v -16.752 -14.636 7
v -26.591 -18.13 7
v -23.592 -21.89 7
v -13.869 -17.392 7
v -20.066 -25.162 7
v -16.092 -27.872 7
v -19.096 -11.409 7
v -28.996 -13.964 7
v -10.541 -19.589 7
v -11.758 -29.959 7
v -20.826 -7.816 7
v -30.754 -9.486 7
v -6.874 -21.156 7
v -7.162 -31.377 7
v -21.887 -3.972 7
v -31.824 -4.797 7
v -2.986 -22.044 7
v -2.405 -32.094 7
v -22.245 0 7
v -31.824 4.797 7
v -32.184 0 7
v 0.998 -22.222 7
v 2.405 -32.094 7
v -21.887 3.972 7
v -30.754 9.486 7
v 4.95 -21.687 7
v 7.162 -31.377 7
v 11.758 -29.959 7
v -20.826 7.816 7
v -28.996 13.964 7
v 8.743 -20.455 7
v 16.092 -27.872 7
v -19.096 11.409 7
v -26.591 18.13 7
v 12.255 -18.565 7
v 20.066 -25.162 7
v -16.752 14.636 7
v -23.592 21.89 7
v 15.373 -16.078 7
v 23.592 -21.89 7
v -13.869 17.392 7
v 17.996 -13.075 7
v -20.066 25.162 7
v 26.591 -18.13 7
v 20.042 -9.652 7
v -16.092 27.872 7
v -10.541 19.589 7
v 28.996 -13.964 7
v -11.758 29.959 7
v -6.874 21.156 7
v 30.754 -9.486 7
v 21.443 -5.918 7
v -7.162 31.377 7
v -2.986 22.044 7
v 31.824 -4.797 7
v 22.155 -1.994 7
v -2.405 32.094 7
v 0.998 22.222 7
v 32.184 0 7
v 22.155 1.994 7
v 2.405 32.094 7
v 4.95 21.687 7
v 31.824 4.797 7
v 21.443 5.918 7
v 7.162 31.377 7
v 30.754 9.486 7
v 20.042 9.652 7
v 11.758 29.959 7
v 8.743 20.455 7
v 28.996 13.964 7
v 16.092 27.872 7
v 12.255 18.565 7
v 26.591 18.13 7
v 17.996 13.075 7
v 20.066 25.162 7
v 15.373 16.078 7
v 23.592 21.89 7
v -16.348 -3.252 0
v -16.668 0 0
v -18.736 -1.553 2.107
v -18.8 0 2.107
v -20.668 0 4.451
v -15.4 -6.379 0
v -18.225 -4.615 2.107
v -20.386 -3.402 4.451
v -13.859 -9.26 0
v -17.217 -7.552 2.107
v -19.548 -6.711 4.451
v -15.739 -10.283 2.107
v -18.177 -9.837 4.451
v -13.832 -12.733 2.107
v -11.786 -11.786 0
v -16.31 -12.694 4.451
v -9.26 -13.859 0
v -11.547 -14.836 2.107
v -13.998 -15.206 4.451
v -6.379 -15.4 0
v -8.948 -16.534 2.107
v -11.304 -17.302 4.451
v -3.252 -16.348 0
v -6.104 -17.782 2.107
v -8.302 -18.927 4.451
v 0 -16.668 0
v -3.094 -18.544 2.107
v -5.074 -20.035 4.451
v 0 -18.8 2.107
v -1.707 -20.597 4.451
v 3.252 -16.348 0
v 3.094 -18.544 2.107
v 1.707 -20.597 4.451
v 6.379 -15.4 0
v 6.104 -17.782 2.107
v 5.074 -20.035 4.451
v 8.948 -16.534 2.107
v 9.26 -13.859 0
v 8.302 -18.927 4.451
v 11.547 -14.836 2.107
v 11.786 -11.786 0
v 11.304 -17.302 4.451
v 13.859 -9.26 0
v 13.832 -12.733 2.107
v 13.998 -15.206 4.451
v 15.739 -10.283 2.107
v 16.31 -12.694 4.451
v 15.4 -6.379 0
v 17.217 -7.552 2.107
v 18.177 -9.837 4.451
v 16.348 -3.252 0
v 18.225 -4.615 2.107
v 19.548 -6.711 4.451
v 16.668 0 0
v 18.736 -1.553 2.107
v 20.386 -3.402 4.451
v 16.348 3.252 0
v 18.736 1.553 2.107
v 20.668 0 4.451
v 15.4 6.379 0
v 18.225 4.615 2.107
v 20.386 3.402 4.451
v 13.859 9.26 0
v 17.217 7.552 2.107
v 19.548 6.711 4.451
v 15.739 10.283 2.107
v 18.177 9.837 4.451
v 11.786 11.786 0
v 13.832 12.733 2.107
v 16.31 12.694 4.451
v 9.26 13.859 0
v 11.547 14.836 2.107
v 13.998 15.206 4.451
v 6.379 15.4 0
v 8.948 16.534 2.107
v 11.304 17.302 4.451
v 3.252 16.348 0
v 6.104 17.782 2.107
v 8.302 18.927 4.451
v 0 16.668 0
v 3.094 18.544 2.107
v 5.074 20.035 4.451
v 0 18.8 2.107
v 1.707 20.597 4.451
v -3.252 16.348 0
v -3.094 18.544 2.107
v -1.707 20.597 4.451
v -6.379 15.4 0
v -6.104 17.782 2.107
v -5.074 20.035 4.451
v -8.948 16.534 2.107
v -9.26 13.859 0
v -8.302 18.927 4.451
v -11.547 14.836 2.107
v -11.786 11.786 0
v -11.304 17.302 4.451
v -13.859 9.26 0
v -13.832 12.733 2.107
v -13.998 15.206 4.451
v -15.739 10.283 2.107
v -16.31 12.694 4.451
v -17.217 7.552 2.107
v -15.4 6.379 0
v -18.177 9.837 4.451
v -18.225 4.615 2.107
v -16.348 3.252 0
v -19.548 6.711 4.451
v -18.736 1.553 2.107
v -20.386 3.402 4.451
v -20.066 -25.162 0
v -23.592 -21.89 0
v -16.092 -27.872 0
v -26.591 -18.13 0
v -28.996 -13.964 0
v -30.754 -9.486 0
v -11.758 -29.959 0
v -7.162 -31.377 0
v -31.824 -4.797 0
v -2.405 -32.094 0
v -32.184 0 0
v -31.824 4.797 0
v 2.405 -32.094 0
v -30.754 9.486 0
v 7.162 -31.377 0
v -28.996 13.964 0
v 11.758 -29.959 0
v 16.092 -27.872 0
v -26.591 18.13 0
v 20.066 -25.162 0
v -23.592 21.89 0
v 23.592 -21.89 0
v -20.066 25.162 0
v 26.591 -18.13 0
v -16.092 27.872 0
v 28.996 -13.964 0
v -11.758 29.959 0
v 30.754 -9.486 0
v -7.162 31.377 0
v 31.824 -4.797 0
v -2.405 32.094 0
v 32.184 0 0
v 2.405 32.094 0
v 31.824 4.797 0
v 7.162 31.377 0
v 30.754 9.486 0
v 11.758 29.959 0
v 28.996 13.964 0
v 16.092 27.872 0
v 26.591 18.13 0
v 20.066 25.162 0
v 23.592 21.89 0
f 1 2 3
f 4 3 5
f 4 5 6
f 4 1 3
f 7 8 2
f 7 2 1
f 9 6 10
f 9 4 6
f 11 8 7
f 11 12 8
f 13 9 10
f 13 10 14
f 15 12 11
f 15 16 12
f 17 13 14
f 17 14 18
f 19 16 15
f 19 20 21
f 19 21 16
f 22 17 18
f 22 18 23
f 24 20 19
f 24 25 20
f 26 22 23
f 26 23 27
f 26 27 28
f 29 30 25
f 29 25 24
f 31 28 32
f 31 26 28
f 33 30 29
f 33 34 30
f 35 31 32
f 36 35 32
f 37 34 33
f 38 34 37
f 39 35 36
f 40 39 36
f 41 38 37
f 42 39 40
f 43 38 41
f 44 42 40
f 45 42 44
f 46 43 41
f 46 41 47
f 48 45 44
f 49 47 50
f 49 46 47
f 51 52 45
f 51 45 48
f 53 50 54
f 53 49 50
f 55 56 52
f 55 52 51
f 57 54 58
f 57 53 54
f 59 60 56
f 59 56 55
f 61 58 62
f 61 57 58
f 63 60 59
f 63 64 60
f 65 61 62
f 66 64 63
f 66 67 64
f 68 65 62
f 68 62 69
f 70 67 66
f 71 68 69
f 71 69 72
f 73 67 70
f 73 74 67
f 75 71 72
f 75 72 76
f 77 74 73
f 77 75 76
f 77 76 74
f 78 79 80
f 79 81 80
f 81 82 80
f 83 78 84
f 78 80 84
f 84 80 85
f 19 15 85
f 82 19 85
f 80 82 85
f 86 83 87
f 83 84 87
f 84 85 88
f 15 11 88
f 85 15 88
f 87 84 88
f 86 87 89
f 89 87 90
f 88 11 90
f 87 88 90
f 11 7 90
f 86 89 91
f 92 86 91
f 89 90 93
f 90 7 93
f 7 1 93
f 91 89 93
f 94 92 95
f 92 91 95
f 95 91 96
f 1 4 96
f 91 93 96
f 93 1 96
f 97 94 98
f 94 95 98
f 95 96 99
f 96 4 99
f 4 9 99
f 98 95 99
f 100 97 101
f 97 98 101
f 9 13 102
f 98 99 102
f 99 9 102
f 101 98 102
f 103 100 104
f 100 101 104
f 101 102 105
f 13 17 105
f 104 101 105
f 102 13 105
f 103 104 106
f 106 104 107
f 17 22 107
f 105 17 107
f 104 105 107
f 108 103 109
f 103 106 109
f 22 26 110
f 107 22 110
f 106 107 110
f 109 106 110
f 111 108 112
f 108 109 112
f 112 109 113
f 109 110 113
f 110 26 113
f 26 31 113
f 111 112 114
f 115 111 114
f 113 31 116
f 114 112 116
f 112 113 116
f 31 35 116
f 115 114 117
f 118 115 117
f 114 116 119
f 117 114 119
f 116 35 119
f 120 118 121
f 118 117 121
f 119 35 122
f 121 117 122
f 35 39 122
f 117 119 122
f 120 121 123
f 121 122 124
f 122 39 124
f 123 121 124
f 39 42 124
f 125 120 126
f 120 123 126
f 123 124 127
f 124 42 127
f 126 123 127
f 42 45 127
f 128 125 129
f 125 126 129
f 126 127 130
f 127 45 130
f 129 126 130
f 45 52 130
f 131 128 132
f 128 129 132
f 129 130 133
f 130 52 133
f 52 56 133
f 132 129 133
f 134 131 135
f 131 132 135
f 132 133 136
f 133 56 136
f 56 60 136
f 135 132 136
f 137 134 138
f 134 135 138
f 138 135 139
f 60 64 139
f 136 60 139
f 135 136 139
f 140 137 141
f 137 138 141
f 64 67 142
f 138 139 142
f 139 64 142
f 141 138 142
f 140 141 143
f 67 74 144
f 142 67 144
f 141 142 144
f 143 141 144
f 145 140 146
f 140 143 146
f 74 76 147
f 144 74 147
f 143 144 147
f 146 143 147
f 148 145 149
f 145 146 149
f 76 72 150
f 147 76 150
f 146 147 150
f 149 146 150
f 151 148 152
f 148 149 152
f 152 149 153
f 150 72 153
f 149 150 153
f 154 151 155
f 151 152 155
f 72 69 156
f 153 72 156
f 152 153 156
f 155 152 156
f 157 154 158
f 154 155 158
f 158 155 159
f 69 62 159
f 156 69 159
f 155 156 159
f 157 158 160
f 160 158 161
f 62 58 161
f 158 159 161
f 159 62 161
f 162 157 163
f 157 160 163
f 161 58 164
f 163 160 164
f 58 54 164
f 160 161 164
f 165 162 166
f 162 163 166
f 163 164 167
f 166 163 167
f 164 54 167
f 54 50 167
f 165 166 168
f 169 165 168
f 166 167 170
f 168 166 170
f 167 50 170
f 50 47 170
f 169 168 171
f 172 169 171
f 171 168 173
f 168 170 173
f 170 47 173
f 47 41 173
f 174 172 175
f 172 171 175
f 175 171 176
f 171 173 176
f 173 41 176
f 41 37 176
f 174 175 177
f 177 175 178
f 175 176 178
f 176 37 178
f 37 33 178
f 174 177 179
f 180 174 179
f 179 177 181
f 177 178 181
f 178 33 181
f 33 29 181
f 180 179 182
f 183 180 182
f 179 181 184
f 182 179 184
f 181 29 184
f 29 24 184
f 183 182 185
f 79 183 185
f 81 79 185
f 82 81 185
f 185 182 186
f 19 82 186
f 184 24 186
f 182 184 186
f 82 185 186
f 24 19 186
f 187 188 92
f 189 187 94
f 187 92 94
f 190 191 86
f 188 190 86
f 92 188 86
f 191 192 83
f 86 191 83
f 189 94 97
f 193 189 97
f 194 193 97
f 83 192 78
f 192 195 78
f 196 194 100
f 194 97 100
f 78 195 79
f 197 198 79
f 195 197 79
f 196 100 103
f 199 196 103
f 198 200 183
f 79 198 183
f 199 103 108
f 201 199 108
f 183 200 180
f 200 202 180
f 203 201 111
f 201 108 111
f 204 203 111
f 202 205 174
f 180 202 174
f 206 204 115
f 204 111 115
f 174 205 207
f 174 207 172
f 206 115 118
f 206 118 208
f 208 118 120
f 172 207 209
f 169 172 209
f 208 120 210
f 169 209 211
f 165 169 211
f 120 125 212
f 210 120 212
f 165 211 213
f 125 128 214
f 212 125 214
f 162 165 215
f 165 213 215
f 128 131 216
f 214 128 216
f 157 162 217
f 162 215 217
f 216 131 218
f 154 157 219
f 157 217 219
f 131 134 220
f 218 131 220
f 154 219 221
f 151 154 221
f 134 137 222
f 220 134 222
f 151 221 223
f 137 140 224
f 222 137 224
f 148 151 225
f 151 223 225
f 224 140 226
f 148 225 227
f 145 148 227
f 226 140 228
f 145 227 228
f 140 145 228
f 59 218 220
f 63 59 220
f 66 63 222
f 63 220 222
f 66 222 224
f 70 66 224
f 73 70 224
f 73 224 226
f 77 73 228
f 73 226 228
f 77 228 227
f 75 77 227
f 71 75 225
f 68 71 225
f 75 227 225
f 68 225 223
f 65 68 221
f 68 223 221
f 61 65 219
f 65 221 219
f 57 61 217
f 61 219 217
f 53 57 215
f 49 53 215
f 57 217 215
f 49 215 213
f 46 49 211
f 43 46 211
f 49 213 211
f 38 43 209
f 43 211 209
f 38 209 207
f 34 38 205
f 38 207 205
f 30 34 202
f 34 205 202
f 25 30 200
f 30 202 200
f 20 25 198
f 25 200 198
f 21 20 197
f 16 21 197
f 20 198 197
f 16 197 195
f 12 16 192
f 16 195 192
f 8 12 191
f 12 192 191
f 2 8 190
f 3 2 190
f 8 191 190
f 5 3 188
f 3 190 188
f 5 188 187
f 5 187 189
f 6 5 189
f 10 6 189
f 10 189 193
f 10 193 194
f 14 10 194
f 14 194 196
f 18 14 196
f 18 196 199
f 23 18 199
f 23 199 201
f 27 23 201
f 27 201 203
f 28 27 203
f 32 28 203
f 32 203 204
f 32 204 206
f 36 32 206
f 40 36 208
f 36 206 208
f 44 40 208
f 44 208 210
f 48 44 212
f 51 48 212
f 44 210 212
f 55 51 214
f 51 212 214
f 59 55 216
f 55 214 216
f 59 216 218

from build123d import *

# Parameters (mm, degrees)
SKETCH2_R           = 32.183564388
BOSS_EXTRUDE1_DEPTH = 7
SKETCH3_R           = 10
CUT_EXTRUDE1_DEPTH  = 47.049577994


with BuildPart() as part:
    # Sketch2 → Boss-Extrude1 (new body)
    with BuildSketch(Plane.XY):
        Circle(SKETCH2_R)
    extrude(amount=BOSS_EXTRUDE1_DEPTH)

    # Sketch3 → Cut-Extrude1 (cut, through all)
    with BuildSketch(Plane.XY.offset(7)):
        Circle(SKETCH3_R)
    extrude(amount=-CUT_EXTRUDE1_DEPTH, mode=Mode.SUBTRACT)

    # Sketch4 → Cut-Revolve1 (revolve, cut)
    with BuildSketch(Plane(origin=(0, 0, 0), x_dir=(1, 0, 0), z_dir=(0, 1, 0))):
        with BuildLine():
            Line((-22.244858179, -7), (0, -7))
            Line((0, -7), (0, 4.212792064))
            Line((0, 4.212792064), (-10, 4.212792064))
            ThreePointArc((-10, 4.212792064), (-17.06939941, -0.359471059), (-22.244858179, -7))
        make_face()
    revolve(axis=Axis((0, 0, -16.764248705), (0, 0, 1)), mode=Mode.SUBTRACT)


solid = part.part
